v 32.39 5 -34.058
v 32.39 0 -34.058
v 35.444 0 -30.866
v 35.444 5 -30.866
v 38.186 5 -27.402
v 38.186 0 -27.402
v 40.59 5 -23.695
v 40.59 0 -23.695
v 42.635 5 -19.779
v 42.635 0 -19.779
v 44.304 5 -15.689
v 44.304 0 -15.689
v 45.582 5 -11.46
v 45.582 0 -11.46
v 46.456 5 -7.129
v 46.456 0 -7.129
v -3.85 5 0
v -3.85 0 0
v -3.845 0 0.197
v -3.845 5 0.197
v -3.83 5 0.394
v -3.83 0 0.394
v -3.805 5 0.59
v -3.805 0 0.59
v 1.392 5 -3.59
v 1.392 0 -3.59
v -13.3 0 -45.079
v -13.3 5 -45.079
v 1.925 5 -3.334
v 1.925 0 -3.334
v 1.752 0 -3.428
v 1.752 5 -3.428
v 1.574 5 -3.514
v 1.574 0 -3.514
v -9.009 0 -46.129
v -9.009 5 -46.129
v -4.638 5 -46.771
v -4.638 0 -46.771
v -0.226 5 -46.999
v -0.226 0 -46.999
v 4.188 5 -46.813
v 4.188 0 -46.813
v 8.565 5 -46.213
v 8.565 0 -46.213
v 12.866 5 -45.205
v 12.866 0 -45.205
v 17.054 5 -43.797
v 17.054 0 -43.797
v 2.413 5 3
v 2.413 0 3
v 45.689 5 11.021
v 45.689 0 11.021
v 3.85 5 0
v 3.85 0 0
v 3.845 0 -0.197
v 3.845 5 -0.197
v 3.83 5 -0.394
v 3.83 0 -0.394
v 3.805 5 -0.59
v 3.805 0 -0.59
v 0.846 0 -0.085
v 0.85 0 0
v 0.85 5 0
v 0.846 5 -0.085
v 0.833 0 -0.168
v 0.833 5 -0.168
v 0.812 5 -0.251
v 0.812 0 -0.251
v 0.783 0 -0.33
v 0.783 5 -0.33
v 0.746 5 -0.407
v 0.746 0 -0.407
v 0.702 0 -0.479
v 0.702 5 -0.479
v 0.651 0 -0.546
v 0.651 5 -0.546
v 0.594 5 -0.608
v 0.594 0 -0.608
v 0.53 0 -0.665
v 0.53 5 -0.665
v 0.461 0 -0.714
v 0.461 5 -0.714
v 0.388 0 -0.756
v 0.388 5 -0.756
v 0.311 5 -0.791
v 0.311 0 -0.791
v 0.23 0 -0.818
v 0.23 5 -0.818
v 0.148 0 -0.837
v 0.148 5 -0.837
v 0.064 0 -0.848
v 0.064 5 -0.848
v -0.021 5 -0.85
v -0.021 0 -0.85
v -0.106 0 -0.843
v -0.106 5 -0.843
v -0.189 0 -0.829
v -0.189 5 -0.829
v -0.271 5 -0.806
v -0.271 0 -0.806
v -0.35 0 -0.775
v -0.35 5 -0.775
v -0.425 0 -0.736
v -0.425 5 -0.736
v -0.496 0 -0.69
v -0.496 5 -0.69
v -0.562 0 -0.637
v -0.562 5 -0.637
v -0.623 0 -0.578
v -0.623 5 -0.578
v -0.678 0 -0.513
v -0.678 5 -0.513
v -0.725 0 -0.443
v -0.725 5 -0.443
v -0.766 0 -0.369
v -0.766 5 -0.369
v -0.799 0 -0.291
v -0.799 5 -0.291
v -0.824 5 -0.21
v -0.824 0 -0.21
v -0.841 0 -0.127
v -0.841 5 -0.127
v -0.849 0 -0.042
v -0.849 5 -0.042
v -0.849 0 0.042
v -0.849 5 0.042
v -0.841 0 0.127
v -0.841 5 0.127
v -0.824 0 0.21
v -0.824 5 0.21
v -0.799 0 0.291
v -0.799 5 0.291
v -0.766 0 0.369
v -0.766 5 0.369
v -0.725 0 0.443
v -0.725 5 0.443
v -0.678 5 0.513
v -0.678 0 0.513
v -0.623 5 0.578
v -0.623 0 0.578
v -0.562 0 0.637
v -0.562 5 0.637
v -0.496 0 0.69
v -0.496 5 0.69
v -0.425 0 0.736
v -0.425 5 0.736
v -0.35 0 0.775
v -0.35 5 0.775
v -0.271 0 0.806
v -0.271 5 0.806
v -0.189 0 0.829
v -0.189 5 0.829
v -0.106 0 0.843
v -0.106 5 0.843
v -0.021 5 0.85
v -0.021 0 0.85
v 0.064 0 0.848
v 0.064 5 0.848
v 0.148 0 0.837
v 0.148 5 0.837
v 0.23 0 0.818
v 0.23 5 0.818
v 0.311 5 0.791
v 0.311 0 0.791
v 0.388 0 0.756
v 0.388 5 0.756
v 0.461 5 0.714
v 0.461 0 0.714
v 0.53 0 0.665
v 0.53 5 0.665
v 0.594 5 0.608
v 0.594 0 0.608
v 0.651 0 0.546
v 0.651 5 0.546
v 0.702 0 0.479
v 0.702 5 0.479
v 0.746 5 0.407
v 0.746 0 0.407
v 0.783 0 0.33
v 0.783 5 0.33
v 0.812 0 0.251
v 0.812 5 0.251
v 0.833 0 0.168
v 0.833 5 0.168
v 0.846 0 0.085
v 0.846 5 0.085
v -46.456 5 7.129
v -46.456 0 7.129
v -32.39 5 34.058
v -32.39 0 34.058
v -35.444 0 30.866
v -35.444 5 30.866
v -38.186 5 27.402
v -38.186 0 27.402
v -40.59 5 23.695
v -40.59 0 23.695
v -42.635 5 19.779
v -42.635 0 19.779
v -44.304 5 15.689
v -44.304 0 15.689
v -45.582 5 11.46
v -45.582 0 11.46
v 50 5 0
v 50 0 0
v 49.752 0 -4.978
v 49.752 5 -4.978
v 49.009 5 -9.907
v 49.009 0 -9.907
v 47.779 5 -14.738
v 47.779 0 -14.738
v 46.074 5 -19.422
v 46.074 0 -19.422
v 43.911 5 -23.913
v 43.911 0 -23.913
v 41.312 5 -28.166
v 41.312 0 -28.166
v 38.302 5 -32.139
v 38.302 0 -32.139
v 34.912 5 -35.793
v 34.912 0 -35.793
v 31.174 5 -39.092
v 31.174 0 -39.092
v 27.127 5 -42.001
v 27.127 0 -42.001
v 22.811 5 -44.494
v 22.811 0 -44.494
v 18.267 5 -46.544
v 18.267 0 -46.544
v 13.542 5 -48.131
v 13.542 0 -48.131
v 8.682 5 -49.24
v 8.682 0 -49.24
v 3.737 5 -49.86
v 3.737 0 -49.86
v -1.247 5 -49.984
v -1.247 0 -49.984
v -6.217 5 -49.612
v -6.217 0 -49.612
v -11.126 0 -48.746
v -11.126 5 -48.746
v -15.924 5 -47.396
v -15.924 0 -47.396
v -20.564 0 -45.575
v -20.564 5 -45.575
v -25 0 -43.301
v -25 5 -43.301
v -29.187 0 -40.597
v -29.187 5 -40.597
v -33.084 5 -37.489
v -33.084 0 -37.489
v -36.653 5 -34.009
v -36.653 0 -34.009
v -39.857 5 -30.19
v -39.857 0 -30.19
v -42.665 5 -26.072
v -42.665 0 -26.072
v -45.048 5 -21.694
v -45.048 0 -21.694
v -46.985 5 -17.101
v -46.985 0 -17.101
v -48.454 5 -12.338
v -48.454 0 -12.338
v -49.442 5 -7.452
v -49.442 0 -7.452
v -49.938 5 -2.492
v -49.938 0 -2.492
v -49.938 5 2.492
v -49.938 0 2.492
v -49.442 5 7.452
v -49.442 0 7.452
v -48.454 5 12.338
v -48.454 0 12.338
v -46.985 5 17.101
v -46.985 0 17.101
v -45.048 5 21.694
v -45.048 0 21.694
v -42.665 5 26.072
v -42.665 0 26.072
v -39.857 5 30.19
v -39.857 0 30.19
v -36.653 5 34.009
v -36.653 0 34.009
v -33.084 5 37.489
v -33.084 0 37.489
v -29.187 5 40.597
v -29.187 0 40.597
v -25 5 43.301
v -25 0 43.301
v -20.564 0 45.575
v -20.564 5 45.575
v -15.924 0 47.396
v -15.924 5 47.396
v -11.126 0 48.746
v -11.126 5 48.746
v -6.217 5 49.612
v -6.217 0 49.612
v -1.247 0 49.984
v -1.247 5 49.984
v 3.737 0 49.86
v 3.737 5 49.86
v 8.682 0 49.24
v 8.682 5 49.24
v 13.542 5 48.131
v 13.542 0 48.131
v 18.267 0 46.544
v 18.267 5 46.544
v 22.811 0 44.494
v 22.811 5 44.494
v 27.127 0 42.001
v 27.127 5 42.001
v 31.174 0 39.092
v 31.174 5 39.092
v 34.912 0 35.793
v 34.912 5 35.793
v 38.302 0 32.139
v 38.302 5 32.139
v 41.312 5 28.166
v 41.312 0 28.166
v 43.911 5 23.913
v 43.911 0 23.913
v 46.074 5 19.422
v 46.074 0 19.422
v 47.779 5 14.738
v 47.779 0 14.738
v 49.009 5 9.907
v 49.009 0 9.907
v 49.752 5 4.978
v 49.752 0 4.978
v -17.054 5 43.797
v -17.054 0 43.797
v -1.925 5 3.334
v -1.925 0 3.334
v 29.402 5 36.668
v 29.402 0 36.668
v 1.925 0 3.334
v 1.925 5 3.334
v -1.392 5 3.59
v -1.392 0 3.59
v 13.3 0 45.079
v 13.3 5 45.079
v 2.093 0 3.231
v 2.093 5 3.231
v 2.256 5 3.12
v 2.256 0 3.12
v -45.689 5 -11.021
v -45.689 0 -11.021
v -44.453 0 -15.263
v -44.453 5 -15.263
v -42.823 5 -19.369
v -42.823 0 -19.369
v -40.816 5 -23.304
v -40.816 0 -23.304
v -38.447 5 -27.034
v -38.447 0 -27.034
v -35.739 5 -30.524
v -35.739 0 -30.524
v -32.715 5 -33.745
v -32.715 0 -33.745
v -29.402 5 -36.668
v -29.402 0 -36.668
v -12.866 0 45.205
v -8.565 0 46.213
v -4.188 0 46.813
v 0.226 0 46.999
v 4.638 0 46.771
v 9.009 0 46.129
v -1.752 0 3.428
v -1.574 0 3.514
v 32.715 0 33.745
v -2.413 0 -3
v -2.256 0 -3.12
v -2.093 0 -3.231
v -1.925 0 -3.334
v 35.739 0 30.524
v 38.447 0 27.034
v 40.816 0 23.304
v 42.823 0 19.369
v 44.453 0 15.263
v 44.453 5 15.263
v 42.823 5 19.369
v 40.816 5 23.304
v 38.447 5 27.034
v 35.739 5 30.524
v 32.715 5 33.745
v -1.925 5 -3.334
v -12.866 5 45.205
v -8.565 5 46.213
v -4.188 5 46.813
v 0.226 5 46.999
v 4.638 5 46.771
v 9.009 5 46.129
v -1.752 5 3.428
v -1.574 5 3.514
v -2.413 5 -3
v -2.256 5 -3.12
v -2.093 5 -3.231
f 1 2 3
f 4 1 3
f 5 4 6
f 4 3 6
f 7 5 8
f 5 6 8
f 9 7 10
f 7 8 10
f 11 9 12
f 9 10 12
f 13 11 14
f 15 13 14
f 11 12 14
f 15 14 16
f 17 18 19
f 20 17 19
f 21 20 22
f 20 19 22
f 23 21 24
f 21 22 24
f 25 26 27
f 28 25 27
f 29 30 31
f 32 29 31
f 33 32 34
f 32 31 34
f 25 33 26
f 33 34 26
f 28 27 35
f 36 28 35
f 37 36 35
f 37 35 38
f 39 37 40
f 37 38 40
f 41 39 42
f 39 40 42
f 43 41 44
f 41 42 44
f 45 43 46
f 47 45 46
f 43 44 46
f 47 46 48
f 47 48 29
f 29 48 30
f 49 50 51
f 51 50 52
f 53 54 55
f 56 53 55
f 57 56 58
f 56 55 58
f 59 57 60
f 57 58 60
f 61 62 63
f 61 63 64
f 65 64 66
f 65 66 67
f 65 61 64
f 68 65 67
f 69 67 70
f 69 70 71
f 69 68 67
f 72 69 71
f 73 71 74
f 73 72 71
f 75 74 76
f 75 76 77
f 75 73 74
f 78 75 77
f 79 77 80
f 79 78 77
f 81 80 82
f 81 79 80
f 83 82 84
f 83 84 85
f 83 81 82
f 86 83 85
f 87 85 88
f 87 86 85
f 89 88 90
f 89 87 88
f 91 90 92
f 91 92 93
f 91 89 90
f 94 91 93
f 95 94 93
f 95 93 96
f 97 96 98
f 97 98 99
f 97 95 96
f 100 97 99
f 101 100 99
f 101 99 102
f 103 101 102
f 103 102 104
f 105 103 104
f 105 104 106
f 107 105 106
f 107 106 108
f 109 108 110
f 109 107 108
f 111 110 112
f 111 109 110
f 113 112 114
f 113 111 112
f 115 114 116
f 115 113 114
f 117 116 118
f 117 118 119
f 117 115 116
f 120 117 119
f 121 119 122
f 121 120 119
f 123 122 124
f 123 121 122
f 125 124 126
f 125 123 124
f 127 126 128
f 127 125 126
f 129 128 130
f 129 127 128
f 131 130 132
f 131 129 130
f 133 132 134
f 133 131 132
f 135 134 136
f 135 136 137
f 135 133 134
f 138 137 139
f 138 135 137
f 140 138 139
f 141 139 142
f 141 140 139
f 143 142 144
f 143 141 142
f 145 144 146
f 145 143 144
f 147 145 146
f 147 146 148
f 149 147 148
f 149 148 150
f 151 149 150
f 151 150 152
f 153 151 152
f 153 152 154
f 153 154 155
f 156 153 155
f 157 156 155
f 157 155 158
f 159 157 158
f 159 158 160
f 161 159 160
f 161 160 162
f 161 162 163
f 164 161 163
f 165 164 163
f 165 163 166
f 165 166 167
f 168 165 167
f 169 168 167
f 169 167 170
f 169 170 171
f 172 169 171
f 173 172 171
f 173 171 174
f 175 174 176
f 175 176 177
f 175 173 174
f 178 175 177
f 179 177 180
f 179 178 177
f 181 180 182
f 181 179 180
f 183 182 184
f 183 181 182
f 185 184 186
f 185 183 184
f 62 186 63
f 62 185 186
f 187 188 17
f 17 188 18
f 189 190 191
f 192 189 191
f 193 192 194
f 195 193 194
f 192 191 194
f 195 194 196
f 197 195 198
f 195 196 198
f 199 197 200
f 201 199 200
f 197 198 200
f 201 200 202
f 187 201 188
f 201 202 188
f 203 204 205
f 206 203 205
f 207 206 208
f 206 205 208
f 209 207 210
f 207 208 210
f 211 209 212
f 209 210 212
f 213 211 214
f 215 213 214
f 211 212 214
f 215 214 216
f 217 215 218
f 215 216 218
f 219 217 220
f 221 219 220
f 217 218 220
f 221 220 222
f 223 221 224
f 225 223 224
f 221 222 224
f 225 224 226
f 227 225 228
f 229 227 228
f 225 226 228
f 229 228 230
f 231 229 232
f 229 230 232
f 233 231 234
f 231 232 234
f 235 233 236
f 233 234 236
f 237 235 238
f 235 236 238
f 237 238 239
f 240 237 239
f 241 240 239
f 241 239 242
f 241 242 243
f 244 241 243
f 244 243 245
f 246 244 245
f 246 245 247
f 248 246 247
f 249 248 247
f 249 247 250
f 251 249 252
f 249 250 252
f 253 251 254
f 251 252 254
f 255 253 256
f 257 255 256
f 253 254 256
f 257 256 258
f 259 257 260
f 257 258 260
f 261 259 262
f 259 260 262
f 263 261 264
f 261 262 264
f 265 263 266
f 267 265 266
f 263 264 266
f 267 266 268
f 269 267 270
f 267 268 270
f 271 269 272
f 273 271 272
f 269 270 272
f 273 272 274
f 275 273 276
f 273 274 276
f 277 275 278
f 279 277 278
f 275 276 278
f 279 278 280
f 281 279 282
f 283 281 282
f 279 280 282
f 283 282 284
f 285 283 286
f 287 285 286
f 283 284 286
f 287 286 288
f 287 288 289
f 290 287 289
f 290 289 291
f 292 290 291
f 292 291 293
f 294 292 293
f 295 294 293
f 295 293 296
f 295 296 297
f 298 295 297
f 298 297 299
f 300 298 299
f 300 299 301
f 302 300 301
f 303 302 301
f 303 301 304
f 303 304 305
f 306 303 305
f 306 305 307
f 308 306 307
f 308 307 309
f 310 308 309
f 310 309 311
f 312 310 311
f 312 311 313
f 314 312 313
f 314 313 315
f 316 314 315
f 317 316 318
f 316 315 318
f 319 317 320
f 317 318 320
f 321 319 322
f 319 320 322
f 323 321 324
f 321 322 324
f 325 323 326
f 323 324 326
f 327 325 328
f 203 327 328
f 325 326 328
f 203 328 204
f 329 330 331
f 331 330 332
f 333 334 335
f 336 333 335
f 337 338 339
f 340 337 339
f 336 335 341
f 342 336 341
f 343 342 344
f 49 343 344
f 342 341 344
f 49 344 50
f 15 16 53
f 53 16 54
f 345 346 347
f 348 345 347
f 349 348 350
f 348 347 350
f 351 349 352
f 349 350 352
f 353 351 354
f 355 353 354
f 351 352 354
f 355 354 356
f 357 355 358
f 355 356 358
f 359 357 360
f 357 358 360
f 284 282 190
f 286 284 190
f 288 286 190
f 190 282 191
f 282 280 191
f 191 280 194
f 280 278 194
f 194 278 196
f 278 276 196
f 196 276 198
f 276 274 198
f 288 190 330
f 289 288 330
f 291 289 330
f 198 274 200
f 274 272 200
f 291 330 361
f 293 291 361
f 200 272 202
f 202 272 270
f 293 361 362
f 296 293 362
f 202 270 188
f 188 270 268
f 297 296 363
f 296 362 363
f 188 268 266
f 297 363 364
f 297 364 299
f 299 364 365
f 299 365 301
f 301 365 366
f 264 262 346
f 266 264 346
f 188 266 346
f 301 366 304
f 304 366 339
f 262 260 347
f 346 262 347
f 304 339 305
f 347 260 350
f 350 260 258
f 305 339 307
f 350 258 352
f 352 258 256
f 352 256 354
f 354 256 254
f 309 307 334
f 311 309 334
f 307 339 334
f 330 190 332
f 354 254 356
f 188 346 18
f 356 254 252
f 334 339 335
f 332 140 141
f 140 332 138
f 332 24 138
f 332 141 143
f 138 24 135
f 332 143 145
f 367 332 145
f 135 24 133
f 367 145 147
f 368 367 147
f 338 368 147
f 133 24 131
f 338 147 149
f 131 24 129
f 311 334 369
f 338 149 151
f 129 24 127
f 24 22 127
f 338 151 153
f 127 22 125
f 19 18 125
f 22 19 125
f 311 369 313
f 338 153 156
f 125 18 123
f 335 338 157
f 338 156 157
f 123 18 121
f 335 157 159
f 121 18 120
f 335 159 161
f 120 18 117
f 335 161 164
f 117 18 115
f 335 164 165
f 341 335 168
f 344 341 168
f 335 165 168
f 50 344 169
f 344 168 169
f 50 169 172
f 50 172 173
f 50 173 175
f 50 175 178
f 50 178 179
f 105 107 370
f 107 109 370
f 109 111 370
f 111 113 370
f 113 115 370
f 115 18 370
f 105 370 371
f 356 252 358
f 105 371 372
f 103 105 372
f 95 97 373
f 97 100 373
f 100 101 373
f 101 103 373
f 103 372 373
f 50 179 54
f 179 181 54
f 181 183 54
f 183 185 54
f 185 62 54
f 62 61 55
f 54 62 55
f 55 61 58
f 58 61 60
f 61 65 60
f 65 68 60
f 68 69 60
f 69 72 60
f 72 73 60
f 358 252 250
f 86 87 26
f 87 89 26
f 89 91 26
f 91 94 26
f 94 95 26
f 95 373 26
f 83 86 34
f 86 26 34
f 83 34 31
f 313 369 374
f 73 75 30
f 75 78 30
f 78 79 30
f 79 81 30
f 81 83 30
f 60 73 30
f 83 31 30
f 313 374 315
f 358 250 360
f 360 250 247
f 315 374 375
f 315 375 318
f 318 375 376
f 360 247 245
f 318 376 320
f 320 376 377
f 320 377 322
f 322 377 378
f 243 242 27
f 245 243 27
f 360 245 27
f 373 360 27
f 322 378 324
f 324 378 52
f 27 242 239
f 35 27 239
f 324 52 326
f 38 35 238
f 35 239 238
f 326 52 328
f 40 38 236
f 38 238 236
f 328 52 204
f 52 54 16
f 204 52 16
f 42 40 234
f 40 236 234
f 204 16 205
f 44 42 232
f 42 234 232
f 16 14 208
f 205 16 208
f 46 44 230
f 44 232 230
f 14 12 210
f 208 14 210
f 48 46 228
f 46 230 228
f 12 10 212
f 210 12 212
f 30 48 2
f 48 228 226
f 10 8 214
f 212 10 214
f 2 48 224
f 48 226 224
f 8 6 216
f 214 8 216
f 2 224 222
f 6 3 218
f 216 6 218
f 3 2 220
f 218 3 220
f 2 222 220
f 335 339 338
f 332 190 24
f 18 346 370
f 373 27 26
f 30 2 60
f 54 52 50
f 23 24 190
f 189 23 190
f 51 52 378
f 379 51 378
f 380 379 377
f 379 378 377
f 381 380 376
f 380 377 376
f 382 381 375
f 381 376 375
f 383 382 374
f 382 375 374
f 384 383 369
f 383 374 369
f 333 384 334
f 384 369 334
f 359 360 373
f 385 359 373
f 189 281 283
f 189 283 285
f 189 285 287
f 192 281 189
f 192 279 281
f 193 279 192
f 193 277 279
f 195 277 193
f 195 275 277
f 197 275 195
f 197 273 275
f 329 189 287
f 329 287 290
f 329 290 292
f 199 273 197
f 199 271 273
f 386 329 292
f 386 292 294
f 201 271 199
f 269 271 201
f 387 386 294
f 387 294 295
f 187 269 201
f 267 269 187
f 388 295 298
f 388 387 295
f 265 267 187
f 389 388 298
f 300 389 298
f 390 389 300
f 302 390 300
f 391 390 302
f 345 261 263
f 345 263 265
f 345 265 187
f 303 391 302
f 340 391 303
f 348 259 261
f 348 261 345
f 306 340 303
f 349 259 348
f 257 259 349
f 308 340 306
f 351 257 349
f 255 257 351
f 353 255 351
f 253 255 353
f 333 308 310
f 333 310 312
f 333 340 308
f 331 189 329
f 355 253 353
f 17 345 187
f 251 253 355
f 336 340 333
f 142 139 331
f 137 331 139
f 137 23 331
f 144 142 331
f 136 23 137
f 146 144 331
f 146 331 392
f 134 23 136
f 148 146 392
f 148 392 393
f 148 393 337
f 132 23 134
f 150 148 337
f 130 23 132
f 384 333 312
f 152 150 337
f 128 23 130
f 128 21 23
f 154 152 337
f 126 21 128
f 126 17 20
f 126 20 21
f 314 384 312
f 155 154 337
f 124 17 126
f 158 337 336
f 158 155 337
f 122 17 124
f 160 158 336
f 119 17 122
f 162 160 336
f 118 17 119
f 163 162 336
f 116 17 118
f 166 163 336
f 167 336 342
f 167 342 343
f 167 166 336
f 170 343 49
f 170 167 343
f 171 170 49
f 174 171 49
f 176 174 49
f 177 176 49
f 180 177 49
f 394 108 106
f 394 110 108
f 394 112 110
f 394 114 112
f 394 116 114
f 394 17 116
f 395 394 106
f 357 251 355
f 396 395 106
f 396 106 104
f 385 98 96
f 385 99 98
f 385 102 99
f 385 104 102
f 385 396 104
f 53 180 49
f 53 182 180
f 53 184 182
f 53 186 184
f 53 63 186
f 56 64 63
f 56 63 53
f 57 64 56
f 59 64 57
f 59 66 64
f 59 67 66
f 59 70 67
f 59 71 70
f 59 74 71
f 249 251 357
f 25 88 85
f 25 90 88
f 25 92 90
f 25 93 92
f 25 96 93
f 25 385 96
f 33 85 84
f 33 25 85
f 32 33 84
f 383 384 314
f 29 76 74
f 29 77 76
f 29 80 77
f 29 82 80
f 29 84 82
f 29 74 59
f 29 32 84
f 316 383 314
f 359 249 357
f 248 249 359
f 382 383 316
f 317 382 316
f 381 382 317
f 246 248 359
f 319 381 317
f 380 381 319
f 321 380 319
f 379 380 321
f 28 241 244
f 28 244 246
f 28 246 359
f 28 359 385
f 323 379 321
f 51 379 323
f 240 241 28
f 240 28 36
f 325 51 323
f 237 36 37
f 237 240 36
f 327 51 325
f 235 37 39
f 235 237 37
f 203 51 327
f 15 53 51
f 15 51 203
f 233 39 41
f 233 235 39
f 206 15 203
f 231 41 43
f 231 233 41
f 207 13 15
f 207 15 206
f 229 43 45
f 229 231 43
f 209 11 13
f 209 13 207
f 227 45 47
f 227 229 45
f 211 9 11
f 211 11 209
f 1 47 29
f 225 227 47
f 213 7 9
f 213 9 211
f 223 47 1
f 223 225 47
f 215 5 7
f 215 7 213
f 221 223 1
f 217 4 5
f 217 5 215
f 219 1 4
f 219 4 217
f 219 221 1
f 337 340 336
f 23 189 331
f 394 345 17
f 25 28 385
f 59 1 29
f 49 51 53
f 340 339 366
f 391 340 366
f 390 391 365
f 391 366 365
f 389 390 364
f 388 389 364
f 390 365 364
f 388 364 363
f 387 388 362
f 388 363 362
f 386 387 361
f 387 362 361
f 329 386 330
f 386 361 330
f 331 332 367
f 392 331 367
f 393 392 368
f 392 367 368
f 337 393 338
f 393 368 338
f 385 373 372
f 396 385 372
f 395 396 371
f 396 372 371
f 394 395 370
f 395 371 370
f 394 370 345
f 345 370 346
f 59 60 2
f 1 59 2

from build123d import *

# Parameters (mm, degrees)
SKETCH1_R           = 50
SKETCH1_R_2         = 47
SKETCH1_R_3         = 3.85
SKETCH1_R_4         = 0.85
BOSS_EXTRUDE1_DEPTH = 5


with BuildPart() as part:
    # Sketch1 → Boss-Extrude1 (new body)
    with BuildSketch(Plane(origin=(0, 0, 0), x_dir=(1, 0, 0), z_dir=(0, 1, 0))):
        Circle(SKETCH1_R)
        Circle(SKETCH1_R_2, mode=Mode.SUBTRACT)
        Circle(SKETCH1_R_3)
        Circle(SKETCH1_R_4, mode=Mode.SUBTRACT)
        with BuildLine():
            ThreePointArc((1.925, -3.334197805), (0.295727162, -3.838625463), (-1.39158336, -3.589706917))
            Line((-1.39158336, -3.589706917), (13.299862292, -45.078971406))
            ThreePointArc((13.299862292, -45.078971406), (21.761273299, -41.658696384), (29.402141879, -36.667615861))
            Line((29.402141879, -36.667615861), (1.925, -3.334197805))
        make_face()
        with BuildLine():
            Line((46.456157771, 7.129193862), (3.85, 0))
            ThreePointArc((3.85, 0), (3.472210748, -1.663205496), (2.412985702, -3))
            Line((2.412985702, -3), (45.68946556, -11.021467091))
            ThreePointArc((45.68946556, -11.021467091), (46.671216404, -5.549554878), (47, 0))
            ThreePointArc((47, 0), (46.86384222, 3.574953479), (46.456157771, 7.129193862))
        make_face()
        with BuildLine():
            Line((17.054015892, 43.796809723), (1.925, 3.334197805))
            ThreePointArc((1.925, 3.334197805), (3.176483585, 2.175419967), (3.804569063, 0.589706917))
            Line((3.804569063, 0.589706917), (32.389603268, 34.057504315))
            ThreePointArc((32.389603268, 34.057504315), (25.196852708, 39.675163687), (17.054015892, 43.796809723))
        make_face()
        with BuildLine():
            Line((-29.402141879, 36.667615861), (-1.925, 3.334197805))
            ThreePointArc((-1.925, 3.334197805), (-0.295727162, 3.838625463), (1.39158336, 3.589706917))
            Line((1.39158336, 3.589706917), (-13.299862292, 45.078971406))
            ThreePointArc((-13.299862292, 45.078971406), (-21.761273299, 41.658696384), (-29.402141879, 36.667615861))
        make_face()
        with BuildLine():
            ThreePointArc((-3.85, 0), (-3.472210748, 1.663205496), (-2.412985702, 3))
            Line((-2.412985702, 3), (-45.68946556, 11.021467091))
            ThreePointArc((-45.68946556, 11.021467091), (-46.958126006, 1.983532697), (-46.456157771, -7.129193862))
            Line((-46.456157771, -7.129193862), (-3.85, 0))
        make_face()
        with BuildLine():
            ThreePointArc((-1.925, -3.334197805), (-3.176483585, -2.175419967), (-3.804569063, -0.589706917))
            Line((-3.804569063, -0.589706917), (-32.389603268, -34.057504315))
            ThreePointArc((-32.389603268, -34.057504315), (-25.196852708, -39.675163687), (-17.054015892, -43.796809723))
            Line((-17.054015892, -43.796809723), (-1.925, -3.334197805))
        make_face()
    extrude(amount=BOSS_EXTRUDE1_DEPTH)


solid = part.part
